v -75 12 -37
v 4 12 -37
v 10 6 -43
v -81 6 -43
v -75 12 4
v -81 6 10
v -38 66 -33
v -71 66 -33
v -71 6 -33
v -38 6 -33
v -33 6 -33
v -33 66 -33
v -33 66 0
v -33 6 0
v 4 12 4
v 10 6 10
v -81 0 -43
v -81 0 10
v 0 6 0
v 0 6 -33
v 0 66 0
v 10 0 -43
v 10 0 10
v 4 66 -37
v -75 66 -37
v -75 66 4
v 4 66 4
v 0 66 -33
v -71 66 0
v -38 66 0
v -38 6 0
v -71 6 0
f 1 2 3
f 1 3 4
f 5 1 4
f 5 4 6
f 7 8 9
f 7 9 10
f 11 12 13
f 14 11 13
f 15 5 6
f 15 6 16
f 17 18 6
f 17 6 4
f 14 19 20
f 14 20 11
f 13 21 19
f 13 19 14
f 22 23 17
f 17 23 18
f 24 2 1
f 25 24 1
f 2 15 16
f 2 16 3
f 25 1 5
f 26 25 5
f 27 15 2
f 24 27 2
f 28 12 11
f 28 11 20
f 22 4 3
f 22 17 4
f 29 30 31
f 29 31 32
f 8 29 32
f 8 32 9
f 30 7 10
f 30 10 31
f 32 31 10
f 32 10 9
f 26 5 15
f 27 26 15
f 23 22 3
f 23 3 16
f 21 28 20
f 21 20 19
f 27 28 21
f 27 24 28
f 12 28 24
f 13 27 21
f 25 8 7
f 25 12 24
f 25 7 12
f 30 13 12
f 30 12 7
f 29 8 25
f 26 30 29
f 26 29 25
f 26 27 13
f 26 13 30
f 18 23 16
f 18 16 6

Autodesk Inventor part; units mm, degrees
ref_plane "YZ Plane" through (0, 0, 0) normal (1, 0, 0) x (0, 1, 0)
ref_plane "XZ Plane" through (0, 0, 0) normal (0, 1, 0) x (-1, 0, 0)
ref_plane "XY Plane" through (0, 0, 0) normal (0, 0, 1) x (1, 0, 0)
sketch "Sketch1" plane through (0, 0, 0) normal (0, 1, 0) x (-1, 0, 0)
  line L0 (0, 0) -> (33, 0)
  line L1 (71, 0) -> (71, -33)
  line L2 (71, -33) -> (38, -33)
  line L3 (0, -33) -> (0, 0)
  line L4 (0, -33) -> (0, 0)
  line L5 (75, -37) -> (75, 4)
  line L6 (75, 4) -> (-4, 4)
  line L7 (-4, 4) -> (-4, -37)
  line L8 (-4, -37) -> (75, -37)
  line L9 (-10, 10) -> (81, 10)
  line L10 (81, 10) -> (81, -43)
  line L11 (81, -43) -> (-10, -43)
  line L12 (-10, -43) -> (-10, 10)
  line L13 (38, -33) -> (38, 0)
  line L14 (33, -33) -> (33, 0)
  line L15 (38, -33) -> (33, -33)
  line L16 (33, -33) -> (0, -33)
  line L17 (38, 0) -> (71, 0)
  line L18 (33, 0) -> (38, 0)
  point P0 (0, -33)
  point P1 (0, -37)
  point P2 (0, 4)
  dimension "d0" = 33
  dimension "d1" = 71
  dimension "d5" = 4
  dimension "d10" = 6
  dimension "d19" = 33
  dimension "d20" = 33
extrude "Extrusion1" add sketch "Sketch1" along normal blind 6 contours L0 L14 L16 L3 | L18 L13 L15 L14 | L17 L1 L2 L13 | L8 L7 L6 L5 | L9 L10 L11 L12
extrude "Extrusion4" add sketch "Sketch1" along normal blind 66 contours L18 L13 L15 L14 | L8 L7 L6 L5
chamfer "Chamfer3" distance 6 angle 45 4 edges at (-75, 6, -16.5) (-35.5, 6, 4) (4, 6, -16.5) (-35.5, 6, -37)
equation "\"d19\" = d0"
equation "\"d20\" = d19"
properties part number "double"
